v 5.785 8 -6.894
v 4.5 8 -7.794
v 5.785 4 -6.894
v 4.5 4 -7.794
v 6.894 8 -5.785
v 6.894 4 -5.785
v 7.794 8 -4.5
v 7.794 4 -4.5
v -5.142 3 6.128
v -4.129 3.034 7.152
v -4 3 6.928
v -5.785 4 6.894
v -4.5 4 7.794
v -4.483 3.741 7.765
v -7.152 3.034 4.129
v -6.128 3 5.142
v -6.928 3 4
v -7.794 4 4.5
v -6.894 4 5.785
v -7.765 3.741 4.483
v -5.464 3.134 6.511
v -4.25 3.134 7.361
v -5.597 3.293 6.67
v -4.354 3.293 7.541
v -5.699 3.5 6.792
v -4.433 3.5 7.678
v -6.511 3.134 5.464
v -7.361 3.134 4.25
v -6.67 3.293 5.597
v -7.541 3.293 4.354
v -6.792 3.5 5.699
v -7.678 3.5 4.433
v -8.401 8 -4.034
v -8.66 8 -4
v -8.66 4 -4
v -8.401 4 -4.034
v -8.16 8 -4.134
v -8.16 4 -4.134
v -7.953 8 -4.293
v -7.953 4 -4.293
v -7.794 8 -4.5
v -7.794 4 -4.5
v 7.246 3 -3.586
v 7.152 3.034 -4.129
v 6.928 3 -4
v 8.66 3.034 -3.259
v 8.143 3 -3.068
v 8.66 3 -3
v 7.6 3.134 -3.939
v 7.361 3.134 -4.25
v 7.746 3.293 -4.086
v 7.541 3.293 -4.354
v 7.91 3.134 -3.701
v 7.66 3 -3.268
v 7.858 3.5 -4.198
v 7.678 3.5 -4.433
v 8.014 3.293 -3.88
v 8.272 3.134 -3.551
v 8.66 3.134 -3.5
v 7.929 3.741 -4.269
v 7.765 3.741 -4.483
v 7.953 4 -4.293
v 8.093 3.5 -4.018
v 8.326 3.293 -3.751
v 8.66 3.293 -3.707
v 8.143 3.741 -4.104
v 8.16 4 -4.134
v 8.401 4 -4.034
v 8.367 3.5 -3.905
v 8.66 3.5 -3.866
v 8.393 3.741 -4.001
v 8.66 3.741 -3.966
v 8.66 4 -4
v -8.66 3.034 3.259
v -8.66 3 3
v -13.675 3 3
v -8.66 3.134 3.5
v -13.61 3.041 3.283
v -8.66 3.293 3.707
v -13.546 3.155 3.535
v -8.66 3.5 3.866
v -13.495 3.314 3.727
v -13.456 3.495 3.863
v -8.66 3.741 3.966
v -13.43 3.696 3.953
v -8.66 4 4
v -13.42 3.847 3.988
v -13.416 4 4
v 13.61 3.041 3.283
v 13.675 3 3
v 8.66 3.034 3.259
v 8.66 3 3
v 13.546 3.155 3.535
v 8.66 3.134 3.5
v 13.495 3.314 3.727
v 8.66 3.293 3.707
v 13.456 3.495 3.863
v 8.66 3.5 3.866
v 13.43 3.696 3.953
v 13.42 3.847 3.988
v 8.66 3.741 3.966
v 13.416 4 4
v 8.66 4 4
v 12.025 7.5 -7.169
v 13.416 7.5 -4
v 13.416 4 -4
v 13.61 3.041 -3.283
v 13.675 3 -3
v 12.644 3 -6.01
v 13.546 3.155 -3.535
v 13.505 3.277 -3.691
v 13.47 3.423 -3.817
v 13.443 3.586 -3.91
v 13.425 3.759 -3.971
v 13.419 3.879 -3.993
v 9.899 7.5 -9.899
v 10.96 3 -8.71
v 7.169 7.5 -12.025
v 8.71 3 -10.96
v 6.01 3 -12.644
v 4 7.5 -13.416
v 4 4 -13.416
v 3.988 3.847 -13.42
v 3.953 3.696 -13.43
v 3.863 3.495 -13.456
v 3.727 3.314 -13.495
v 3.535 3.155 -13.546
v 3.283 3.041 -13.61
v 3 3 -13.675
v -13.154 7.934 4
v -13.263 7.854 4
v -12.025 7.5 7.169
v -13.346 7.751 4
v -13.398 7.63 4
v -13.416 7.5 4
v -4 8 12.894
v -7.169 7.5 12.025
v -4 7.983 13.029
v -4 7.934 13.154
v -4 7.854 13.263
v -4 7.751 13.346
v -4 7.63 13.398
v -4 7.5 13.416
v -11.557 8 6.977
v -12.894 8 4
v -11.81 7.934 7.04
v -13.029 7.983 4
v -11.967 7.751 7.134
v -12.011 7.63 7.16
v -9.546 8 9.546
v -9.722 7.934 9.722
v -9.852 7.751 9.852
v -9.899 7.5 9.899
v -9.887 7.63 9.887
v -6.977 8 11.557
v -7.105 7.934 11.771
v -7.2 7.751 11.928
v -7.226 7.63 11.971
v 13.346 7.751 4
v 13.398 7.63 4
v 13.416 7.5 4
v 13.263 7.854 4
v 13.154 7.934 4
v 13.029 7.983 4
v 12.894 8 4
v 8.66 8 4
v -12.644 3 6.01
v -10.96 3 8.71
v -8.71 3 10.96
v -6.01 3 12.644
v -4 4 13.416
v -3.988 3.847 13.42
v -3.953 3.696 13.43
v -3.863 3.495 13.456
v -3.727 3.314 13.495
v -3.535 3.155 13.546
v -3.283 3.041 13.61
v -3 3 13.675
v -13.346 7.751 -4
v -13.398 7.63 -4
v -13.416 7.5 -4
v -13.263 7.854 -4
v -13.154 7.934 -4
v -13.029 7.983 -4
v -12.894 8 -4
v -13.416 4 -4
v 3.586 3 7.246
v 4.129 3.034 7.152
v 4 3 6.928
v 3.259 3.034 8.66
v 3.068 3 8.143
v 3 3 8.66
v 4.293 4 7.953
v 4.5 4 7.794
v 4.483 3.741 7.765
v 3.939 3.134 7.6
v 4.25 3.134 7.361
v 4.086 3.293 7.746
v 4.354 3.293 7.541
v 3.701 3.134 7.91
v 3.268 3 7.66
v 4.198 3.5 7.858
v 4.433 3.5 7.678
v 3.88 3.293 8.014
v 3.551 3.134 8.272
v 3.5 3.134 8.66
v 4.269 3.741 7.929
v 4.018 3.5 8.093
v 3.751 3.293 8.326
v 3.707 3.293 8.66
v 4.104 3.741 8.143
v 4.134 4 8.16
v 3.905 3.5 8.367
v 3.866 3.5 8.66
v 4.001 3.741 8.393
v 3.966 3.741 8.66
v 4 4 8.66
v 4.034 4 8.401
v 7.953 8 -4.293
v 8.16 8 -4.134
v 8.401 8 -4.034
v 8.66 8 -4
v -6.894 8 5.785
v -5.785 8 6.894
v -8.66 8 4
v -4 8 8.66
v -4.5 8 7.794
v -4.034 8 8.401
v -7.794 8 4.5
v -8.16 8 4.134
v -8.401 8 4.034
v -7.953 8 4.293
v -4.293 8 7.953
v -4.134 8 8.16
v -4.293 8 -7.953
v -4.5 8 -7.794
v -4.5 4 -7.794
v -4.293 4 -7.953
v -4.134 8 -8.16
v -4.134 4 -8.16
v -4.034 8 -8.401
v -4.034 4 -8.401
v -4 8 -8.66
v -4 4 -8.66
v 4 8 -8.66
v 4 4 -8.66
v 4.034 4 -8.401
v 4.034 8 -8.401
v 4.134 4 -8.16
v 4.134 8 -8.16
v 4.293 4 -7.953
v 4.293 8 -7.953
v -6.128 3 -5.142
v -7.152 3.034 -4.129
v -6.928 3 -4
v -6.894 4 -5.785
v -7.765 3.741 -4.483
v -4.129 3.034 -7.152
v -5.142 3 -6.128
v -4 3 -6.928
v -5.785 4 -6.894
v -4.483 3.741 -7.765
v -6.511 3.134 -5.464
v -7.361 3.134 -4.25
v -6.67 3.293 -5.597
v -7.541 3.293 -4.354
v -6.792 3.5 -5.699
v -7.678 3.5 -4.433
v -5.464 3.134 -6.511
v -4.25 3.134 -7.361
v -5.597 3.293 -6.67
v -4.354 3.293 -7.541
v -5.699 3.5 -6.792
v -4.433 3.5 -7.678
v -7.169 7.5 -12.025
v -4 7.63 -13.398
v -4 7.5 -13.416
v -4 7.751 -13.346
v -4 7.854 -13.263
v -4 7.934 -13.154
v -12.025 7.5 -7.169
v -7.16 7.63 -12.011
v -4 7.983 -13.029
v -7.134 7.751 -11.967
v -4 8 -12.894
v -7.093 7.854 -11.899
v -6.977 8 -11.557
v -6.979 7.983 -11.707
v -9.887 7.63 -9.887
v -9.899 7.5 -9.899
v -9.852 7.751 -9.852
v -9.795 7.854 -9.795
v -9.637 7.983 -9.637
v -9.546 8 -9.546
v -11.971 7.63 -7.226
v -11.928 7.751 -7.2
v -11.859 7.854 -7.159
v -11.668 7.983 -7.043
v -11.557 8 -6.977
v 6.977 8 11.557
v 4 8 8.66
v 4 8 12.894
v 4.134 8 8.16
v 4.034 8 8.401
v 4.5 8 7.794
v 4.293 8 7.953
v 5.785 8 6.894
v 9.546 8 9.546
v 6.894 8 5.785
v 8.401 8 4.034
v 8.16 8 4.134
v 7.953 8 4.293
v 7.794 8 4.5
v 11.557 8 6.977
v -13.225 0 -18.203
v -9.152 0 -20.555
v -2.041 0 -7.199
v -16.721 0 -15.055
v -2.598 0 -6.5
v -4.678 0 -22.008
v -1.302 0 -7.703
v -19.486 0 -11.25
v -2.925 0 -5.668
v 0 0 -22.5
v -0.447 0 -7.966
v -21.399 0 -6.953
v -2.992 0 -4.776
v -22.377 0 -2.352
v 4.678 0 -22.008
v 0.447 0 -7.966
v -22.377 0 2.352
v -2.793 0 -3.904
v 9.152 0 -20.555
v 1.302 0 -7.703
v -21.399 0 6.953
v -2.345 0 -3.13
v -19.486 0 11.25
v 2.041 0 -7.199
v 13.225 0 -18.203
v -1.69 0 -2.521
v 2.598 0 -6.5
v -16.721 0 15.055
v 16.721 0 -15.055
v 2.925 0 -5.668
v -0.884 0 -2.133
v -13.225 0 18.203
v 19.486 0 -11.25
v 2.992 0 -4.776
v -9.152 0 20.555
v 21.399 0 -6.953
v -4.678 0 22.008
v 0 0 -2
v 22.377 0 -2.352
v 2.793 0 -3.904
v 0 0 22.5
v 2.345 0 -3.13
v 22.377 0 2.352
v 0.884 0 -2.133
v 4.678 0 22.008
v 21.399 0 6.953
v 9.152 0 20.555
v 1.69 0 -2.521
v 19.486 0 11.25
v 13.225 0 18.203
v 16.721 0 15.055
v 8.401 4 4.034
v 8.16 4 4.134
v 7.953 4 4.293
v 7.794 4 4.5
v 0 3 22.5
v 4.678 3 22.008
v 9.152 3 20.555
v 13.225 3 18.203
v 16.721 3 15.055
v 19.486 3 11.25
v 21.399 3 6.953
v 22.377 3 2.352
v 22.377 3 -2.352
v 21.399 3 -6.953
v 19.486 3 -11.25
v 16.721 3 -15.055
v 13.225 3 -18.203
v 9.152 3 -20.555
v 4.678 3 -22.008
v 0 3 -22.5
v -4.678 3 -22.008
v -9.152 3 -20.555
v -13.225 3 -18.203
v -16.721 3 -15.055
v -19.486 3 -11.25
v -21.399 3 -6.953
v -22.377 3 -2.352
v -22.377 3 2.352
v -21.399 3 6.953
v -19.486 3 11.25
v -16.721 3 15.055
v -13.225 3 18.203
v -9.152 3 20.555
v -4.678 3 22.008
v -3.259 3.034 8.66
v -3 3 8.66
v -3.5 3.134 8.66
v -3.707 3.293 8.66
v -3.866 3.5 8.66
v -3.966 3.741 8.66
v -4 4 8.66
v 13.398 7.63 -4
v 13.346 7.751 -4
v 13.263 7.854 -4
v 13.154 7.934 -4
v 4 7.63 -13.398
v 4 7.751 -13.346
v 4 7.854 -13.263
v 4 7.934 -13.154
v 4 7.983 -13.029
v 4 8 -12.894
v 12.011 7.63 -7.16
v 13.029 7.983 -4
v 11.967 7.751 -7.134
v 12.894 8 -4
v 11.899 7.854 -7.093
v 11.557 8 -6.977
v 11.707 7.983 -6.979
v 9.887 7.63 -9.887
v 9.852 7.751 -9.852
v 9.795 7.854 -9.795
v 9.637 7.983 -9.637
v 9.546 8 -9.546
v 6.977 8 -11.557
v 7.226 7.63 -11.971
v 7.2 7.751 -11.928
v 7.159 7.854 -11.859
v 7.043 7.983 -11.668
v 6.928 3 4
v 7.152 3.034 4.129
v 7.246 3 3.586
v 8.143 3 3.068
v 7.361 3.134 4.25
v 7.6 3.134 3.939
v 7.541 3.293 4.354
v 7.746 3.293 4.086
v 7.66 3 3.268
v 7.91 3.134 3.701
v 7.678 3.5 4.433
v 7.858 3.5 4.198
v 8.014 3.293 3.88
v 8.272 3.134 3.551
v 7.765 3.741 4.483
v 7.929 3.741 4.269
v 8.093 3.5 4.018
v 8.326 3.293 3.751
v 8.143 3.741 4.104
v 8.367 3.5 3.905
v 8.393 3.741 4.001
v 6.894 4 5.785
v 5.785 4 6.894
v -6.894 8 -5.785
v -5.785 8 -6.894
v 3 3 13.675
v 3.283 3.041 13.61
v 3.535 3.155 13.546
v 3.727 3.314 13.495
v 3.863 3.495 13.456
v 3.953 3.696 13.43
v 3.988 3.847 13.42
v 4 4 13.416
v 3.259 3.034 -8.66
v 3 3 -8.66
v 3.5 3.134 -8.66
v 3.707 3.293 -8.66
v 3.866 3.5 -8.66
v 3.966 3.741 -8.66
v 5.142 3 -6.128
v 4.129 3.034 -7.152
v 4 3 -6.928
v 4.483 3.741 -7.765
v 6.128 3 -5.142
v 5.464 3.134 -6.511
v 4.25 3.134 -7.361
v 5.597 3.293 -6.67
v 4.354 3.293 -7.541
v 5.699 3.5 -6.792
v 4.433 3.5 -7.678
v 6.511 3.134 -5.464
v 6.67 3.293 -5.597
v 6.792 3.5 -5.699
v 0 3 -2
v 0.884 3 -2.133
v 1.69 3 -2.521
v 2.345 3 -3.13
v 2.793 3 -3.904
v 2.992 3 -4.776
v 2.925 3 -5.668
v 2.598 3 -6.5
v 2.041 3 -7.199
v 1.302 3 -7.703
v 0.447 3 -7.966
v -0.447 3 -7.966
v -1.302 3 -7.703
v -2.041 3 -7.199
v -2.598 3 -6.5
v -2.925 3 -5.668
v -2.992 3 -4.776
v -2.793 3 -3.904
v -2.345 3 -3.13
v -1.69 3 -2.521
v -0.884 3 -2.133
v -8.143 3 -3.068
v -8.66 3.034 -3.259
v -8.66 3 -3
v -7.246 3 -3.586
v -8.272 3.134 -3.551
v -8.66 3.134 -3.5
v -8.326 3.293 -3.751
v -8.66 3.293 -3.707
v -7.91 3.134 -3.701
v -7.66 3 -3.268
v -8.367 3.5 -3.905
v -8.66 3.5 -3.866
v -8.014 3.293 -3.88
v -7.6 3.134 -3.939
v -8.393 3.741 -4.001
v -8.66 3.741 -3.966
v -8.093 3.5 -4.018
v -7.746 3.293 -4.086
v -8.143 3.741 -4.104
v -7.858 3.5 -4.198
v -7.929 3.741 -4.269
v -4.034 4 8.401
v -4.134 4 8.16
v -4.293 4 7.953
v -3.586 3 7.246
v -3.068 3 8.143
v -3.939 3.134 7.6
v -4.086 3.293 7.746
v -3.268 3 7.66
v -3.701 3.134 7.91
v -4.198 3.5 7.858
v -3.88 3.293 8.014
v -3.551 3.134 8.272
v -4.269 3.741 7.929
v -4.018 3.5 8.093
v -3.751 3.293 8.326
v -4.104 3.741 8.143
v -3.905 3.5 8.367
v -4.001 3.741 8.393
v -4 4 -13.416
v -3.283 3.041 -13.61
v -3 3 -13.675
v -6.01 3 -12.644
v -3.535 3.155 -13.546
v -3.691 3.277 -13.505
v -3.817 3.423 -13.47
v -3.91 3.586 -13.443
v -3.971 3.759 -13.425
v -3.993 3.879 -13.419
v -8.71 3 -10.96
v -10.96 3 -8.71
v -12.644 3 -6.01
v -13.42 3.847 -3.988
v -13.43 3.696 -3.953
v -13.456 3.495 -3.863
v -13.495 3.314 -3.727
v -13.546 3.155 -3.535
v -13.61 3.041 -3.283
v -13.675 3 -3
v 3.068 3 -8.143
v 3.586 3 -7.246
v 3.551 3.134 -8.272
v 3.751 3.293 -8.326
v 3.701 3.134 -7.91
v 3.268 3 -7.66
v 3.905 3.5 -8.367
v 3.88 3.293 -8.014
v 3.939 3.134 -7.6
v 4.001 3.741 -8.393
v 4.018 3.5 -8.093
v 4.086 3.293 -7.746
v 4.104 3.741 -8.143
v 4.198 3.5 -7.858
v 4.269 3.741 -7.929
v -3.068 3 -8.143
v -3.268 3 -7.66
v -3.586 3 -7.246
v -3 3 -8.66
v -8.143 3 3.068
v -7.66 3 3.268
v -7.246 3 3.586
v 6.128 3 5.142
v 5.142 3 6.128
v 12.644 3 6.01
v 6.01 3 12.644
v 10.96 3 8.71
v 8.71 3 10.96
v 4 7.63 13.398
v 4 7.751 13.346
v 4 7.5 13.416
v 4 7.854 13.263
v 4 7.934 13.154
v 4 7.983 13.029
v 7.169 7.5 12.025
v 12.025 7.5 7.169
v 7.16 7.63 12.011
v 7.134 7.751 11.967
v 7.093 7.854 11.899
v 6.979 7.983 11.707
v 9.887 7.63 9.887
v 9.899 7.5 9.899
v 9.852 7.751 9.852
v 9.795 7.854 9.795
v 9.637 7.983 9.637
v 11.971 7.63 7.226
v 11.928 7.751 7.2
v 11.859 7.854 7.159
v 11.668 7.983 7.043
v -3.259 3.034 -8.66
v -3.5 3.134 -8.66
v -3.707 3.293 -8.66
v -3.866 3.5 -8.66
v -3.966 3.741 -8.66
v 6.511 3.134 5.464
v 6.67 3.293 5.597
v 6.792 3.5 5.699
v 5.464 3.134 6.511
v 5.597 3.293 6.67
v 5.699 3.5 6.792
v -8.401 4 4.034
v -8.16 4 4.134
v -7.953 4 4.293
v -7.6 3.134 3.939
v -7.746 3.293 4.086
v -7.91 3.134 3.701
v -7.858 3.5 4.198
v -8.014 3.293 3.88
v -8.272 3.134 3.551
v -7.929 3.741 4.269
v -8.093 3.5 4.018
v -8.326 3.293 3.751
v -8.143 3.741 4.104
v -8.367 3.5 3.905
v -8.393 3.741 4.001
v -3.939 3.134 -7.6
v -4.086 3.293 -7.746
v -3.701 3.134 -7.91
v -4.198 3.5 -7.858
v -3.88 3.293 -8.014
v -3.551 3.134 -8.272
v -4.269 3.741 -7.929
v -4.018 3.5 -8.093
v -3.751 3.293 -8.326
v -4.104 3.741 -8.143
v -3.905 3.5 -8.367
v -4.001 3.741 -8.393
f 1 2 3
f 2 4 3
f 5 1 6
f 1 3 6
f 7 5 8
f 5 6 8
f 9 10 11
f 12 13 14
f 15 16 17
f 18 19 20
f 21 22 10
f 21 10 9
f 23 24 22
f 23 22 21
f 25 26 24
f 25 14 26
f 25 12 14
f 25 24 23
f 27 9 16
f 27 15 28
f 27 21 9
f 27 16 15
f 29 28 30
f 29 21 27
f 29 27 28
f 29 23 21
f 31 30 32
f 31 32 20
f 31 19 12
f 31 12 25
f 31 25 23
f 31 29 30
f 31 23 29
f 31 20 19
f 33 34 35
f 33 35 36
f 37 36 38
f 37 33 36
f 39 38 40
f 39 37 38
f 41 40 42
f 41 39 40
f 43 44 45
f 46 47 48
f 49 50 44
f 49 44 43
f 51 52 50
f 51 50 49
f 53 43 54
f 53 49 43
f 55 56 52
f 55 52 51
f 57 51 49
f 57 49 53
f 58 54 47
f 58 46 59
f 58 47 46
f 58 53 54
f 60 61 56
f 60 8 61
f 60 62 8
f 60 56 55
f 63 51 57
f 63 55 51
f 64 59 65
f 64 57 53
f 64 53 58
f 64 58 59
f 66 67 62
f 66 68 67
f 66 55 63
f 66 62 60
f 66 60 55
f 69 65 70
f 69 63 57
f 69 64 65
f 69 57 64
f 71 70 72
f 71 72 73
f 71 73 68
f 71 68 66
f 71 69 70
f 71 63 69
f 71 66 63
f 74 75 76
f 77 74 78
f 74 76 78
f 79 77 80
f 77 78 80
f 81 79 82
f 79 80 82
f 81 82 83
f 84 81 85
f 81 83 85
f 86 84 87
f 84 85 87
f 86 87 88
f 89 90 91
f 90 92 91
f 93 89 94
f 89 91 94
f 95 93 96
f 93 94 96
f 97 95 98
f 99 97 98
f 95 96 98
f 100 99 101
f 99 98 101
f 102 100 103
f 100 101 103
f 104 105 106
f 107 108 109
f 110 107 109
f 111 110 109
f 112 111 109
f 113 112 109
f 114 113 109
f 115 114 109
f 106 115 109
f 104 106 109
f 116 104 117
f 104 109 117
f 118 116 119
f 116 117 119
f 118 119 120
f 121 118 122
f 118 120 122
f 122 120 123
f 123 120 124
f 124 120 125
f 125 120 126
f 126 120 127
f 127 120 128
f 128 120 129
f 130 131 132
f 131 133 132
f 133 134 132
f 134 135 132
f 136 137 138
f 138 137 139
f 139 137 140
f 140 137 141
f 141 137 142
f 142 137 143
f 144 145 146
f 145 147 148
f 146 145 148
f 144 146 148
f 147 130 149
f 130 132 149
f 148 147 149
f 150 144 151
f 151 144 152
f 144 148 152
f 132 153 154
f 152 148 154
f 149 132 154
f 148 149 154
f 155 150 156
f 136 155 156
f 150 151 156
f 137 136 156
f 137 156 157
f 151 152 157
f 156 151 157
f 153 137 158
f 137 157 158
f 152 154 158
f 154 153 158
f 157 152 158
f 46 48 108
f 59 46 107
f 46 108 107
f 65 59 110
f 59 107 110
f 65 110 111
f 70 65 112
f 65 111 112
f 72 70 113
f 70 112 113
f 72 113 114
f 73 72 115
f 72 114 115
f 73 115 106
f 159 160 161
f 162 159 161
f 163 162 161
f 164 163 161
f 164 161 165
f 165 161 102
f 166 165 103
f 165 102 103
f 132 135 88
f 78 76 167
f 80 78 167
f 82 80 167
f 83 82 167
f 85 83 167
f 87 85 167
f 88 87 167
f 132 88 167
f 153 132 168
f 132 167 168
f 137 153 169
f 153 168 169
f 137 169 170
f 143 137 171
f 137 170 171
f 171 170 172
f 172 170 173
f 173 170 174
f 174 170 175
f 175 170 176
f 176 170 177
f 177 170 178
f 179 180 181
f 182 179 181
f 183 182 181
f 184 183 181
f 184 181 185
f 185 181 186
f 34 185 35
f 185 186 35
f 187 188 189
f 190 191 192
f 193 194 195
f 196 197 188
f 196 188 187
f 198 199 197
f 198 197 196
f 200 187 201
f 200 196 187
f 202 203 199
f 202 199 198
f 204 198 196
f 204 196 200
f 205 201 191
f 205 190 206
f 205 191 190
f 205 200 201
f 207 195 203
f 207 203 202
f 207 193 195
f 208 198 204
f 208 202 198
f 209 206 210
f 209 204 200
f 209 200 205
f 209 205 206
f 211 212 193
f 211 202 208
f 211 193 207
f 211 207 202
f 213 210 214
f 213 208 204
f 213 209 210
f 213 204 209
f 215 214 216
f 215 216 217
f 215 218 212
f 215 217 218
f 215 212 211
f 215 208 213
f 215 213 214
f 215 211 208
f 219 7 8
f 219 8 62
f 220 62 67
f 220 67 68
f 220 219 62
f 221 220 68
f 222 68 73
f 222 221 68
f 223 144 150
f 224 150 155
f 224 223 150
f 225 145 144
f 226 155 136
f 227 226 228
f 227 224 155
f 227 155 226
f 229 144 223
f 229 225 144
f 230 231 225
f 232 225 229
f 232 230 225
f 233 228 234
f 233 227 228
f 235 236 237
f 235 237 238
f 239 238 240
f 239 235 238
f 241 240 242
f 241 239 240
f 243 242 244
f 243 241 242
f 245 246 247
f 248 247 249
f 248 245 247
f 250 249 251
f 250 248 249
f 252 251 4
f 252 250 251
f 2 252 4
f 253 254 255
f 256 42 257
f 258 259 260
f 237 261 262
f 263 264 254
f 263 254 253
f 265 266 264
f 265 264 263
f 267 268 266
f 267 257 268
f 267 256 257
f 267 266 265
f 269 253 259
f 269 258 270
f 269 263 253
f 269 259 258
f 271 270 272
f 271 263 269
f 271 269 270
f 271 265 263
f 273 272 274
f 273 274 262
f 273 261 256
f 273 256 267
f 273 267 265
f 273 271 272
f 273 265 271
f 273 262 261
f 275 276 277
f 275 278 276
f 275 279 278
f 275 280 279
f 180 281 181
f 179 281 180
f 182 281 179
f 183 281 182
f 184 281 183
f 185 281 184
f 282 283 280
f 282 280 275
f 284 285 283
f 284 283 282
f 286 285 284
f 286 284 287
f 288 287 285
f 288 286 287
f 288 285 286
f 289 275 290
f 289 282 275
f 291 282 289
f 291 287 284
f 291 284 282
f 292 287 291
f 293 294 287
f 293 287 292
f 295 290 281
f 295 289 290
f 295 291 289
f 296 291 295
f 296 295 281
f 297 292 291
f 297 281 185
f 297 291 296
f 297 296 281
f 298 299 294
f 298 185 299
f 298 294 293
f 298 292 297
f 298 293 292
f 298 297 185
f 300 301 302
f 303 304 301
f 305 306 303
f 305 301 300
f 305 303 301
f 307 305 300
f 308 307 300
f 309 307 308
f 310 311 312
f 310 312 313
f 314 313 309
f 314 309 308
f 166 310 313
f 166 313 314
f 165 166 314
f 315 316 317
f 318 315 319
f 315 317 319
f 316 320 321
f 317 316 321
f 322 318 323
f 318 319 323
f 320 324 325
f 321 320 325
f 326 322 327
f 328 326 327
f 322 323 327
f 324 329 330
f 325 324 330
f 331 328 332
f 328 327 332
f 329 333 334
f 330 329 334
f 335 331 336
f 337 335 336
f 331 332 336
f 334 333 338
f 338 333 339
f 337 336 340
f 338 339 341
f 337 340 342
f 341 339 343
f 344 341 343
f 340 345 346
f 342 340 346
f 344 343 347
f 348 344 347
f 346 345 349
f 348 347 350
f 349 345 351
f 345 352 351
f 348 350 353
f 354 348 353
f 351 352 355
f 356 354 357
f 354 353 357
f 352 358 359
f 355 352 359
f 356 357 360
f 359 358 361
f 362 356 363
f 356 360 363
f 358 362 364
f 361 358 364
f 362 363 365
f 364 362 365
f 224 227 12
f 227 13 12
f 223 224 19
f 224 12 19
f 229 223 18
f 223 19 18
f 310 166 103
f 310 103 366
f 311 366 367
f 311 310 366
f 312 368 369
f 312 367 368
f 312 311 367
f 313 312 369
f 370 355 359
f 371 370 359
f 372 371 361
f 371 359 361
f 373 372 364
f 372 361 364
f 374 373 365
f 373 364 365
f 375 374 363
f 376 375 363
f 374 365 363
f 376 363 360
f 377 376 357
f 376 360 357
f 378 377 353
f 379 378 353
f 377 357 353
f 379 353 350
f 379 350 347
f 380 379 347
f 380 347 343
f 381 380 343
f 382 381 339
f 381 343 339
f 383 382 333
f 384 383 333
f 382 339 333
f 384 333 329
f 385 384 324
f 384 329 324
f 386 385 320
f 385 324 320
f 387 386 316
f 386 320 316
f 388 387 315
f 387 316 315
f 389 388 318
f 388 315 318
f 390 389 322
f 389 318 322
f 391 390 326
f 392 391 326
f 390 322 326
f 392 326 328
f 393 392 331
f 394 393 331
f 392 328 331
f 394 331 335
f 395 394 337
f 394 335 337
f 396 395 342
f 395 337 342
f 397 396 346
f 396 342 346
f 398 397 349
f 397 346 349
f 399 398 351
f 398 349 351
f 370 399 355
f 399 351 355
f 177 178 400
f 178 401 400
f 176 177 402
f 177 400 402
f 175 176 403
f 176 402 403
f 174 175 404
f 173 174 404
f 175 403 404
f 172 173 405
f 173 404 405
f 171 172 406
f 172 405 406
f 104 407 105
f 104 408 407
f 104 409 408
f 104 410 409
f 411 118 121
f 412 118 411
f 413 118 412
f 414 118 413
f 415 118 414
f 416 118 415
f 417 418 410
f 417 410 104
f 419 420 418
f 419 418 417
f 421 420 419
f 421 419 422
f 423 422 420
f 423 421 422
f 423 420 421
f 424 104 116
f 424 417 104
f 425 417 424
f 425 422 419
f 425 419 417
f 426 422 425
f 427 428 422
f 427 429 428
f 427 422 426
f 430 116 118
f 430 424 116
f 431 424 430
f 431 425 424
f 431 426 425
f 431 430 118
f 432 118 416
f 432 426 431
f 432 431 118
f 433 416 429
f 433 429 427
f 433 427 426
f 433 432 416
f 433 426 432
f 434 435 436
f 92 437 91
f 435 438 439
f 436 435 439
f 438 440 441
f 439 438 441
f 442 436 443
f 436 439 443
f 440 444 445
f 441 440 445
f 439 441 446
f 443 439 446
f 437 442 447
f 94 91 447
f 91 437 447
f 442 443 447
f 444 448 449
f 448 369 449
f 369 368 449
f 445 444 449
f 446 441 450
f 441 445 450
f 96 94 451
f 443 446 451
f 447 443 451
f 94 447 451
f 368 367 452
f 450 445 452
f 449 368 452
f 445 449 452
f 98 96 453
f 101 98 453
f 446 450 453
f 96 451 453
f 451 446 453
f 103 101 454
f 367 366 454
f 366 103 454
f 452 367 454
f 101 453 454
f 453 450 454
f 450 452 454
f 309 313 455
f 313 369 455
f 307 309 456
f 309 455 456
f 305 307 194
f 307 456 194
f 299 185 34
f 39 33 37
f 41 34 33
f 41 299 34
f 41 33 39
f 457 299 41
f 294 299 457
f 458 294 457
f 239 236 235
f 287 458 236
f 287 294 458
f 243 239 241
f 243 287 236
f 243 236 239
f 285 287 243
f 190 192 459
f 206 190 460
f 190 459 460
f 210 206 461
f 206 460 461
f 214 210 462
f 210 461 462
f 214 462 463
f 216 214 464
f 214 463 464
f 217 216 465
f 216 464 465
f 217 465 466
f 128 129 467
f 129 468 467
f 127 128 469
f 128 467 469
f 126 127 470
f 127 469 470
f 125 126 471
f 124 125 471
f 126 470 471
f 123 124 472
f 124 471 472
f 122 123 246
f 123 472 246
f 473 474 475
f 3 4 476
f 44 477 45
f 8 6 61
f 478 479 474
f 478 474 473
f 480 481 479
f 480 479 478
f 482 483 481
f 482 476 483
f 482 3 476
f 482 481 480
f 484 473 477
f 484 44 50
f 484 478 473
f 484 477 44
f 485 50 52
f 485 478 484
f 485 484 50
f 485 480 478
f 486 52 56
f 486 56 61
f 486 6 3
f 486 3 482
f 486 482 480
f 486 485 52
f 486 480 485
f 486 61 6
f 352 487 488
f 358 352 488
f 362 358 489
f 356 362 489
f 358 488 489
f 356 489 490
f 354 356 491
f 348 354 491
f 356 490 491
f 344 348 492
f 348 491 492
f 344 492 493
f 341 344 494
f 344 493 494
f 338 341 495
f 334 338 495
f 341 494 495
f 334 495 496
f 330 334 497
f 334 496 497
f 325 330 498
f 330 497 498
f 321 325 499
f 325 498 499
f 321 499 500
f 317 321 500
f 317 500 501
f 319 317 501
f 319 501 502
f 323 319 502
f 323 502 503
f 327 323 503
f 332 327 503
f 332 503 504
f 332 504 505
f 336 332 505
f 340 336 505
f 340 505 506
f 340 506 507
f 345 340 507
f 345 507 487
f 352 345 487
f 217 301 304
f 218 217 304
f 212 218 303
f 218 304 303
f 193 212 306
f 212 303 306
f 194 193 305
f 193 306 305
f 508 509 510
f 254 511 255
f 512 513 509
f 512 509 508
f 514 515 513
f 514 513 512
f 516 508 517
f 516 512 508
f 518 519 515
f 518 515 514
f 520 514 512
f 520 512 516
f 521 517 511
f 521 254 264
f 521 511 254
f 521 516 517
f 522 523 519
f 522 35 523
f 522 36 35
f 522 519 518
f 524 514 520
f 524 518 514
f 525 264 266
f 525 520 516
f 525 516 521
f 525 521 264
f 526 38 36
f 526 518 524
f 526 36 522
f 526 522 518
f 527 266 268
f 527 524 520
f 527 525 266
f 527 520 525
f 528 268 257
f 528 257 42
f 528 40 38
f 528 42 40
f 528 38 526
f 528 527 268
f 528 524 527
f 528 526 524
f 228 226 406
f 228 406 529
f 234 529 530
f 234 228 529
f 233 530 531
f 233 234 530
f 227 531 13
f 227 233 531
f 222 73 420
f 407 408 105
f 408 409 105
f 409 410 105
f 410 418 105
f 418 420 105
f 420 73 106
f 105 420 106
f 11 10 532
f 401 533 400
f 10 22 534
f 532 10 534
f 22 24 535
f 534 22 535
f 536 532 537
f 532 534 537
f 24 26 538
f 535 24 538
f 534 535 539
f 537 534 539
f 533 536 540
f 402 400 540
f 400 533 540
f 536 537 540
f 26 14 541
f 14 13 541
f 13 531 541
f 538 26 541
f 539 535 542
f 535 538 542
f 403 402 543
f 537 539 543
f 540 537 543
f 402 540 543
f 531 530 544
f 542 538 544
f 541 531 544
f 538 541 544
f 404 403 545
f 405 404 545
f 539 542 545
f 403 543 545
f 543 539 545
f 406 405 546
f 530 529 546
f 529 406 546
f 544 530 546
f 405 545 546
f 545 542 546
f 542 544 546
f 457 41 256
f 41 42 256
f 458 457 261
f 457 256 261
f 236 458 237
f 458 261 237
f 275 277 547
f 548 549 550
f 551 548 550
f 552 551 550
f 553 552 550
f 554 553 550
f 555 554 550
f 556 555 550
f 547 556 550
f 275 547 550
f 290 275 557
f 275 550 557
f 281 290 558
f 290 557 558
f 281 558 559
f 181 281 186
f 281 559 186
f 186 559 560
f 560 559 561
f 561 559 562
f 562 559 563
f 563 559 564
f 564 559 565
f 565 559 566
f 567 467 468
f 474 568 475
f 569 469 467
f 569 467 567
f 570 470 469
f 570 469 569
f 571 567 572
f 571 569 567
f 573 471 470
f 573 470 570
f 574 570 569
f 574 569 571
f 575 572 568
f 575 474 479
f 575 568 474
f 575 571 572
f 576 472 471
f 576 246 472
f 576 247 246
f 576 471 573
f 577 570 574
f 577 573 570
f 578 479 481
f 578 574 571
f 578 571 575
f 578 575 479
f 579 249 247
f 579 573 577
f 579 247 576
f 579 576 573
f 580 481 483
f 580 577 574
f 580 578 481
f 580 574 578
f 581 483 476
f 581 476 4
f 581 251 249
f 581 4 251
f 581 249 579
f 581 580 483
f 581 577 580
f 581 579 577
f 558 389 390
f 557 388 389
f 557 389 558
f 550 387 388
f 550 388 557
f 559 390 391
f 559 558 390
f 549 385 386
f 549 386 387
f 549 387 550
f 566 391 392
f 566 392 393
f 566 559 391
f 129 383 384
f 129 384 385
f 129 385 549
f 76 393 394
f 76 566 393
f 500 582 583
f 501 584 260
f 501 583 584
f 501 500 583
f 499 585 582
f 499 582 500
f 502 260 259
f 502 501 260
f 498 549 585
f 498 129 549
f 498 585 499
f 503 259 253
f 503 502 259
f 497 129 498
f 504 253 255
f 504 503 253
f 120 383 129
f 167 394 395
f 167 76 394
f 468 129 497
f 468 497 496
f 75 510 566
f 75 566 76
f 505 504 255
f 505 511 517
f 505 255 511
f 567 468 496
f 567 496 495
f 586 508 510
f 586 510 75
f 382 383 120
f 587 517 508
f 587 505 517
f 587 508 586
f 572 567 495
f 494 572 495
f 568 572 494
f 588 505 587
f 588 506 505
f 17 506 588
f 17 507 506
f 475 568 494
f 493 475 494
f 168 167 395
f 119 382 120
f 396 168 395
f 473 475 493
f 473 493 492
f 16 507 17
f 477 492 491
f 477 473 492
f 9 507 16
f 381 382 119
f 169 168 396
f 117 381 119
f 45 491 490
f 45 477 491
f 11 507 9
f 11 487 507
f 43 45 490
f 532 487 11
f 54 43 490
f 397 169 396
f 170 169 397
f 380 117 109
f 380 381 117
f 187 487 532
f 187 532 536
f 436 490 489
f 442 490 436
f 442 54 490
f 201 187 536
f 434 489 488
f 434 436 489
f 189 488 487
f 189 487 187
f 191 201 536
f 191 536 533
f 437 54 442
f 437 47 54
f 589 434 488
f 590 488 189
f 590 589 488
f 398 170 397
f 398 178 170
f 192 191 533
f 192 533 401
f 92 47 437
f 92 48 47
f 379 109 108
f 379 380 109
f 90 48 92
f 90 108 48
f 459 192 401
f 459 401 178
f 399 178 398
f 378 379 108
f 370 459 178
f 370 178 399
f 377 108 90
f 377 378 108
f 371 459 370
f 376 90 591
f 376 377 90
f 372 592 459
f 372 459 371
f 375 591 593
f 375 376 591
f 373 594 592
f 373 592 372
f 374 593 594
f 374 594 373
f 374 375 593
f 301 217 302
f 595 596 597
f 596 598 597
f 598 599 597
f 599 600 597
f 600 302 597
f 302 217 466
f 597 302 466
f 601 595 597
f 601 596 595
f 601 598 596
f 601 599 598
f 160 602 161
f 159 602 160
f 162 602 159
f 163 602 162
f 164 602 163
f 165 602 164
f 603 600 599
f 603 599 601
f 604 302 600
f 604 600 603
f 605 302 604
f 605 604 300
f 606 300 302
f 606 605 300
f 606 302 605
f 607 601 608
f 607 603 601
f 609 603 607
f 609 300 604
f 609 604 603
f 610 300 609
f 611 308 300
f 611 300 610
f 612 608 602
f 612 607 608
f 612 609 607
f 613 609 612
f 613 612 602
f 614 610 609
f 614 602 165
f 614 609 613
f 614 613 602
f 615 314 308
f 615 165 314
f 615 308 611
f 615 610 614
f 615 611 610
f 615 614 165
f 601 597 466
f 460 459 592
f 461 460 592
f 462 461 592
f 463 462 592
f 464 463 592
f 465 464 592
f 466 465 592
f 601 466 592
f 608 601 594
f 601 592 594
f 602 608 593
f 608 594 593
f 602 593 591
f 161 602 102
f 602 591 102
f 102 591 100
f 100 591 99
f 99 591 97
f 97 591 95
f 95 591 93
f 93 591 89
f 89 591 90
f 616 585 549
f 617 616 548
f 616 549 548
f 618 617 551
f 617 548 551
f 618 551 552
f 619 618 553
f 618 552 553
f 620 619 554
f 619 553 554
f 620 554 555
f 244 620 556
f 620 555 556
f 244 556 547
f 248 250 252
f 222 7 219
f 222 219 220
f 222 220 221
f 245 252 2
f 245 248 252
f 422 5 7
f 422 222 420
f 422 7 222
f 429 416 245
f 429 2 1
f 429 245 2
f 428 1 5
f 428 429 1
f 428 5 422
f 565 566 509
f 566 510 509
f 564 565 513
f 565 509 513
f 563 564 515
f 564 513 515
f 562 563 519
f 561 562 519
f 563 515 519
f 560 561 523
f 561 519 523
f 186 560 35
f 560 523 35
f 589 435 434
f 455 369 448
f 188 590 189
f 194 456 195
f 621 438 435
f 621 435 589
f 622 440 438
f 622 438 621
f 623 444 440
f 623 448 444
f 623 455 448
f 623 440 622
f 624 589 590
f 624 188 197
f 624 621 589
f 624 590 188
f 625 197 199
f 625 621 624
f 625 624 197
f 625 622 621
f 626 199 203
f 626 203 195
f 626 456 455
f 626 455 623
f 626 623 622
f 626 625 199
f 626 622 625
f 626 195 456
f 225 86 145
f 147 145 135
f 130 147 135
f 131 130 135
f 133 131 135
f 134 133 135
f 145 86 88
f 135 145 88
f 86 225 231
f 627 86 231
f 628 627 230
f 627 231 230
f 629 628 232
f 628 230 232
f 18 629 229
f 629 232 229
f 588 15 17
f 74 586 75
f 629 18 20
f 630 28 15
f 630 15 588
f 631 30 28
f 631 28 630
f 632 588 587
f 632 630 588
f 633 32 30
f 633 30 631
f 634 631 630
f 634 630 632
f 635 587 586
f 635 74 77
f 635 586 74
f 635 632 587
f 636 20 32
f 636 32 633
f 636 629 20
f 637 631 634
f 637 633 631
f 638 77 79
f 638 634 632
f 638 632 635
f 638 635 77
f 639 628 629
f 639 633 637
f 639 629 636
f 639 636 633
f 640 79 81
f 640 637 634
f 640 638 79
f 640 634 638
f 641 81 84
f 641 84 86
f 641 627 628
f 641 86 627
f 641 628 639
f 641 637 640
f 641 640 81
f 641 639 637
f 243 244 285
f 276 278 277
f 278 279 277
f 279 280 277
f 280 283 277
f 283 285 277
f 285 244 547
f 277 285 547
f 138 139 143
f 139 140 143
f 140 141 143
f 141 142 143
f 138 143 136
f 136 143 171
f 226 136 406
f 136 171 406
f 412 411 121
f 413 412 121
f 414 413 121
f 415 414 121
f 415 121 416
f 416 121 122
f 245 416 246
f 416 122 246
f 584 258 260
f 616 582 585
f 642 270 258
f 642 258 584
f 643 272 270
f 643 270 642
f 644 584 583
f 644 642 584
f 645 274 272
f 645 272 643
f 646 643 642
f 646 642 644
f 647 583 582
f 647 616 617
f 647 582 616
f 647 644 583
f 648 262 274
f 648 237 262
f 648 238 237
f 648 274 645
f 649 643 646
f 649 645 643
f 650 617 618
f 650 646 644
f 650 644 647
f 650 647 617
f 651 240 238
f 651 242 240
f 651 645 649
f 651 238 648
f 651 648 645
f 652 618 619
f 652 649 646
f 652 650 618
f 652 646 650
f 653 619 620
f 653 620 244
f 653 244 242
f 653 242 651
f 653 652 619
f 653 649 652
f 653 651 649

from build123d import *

# Parameters (mm, degrees)
SKETCH2_R           = 22.5
BOSS_EXTRUDE1_DEPTH = 3
BOSS_EXTRUDE2_DEPTH = 5
FILLET1_R           = 1
FILLET2_R           = 0.5
SKETCH5_R           = 3
CUT_EXTRUDE1_DEPTH  = 5


with BuildPart() as part:
    # Sketch2 → Boss-Extrude1 (new body)
    with BuildSketch(Plane(origin=(0, 0, 0), x_dir=(1, 0, 0), z_dir=(0, 1, 0))):
        with Locations(Location((0, 0, 0), (0, 0, 270))):
            Circle(SKETCH2_R)
    extrude(amount=BOSS_EXTRUDE1_DEPTH)

    # Sketch3 → Boss-Extrude2 (add)
    with BuildSketch(Plane(origin=(0, 3, 0), x_dir=(1, 0, 0), z_dir=(0, 1, 0))):
        with BuildLine():
            ThreePointArc((-4, 13.416407865), (-9.899494937, 9.899494937), (-13.416407865, 4))
            Line((-13.416407865, 4), (-8.062257748, 4))
            ThreePointArc((-8.062257748, 4), (-6.363961031, 6.363961031), (-4, 8.062257748))
            Line((-4, 8.062257748), (-4, 13.416407865))
        make_face()
        with BuildLine():
            ThreePointArc((13.416407865, 4), (9.899494937, 9.899494937), (4, 13.416407865))
            Line((4, 13.416407865), (4, 8.062257748))
            ThreePointArc((4, 8.062257748), (6.363961031, 6.363961031), (8.062257748, 4))
            Line((8.062257748, 4), (13.416407865, 4))
        make_face()
        with BuildLine():
            Line((4, -8.062257748), (4, -13.416407865))
            ThreePointArc((4, -13.416407865), (9.899494937, -9.899494937), (13.416407865, -4))
            Line((13.416407865, -4), (8.062257748, -4))
            ThreePointArc((8.062257748, -4), (6.363961031, -6.363961031), (4, -8.062257748))
        make_face()
        with BuildLine():
            Line((-8.062257748, -4), (-13.416407865, -4))
            ThreePointArc((-13.416407865, -4), (-9.899494937, -9.899494937), (-4, -13.416407865))
            Line((-4, -13.416407865), (-4, -8.062257748))
            ThreePointArc((-4, -8.062257748), (-6.363961031, -6.363961031), (-8.062257748, -4))
        make_face()
    extrude(amount=BOSS_EXTRUDE2_DEPTH)

    # Fillet1
    fillet1_edges = [part.edges().sort_by_distance(p)[0] for p in [
        (-6.363961031, 3, -6.363961031),
        (-4, 3, -10.739332807),
        (4, 5.5, -8.062257748),
        (10.739332807, 3, -4),
        (8.062257748, 5.5, -4),
        (4, 3, -10.739332807),
        (6.363961031, 3, -6.363961031),
        (8.062257748, 5.5, 4),
        (4, 3, 10.739332807),
        (4, 5.5, 8.062257748),
        (6.363961031, 3, 6.363961031),
        (10.739332807, 3, 4),
        (-4, 5.5, 8.062257748),
        (-8.062257748, 5.5, 4),
        (-6.363961031, 3, 6.363961031),
        (-4, 3, 10.739332807),
        (-10.739332807, 3, 4),
        (-8.062257748, 5.5, -4),
        (-4, 5.5, -8.062257748),
        (-10.739332807, 3, -4),
    ]]
    fillet(fillet1_edges, radius=FILLET1_R)

    # Fillet2
    fillet2_edges = [part.edges().sort_by_distance(p)[0] for p in [
        (9.899494937, 8, -9.899494937),
        (9.899494937, 8, 9.899494937),
        (-9.899494937, 8, 9.899494937),
        (-9.899494937, 8, -9.899494937),
    ]]
    fillet(fillet2_edges, radius=FILLET2_R)

    # Sketch5 → Cut-Extrude1 (cut)
    with BuildSketch(Plane(origin=(0, 3, 0), x_dir=(1, 0, 0), z_dir=(0, 1, 0))):
        with Locations(Location((0, 5, 0), (0, 0, 270))):
            Circle(SKETCH5_R)
    extrude(amount=-CUT_EXTRUDE1_DEPTH, mode=Mode.SUBTRACT)


solid = part.part
